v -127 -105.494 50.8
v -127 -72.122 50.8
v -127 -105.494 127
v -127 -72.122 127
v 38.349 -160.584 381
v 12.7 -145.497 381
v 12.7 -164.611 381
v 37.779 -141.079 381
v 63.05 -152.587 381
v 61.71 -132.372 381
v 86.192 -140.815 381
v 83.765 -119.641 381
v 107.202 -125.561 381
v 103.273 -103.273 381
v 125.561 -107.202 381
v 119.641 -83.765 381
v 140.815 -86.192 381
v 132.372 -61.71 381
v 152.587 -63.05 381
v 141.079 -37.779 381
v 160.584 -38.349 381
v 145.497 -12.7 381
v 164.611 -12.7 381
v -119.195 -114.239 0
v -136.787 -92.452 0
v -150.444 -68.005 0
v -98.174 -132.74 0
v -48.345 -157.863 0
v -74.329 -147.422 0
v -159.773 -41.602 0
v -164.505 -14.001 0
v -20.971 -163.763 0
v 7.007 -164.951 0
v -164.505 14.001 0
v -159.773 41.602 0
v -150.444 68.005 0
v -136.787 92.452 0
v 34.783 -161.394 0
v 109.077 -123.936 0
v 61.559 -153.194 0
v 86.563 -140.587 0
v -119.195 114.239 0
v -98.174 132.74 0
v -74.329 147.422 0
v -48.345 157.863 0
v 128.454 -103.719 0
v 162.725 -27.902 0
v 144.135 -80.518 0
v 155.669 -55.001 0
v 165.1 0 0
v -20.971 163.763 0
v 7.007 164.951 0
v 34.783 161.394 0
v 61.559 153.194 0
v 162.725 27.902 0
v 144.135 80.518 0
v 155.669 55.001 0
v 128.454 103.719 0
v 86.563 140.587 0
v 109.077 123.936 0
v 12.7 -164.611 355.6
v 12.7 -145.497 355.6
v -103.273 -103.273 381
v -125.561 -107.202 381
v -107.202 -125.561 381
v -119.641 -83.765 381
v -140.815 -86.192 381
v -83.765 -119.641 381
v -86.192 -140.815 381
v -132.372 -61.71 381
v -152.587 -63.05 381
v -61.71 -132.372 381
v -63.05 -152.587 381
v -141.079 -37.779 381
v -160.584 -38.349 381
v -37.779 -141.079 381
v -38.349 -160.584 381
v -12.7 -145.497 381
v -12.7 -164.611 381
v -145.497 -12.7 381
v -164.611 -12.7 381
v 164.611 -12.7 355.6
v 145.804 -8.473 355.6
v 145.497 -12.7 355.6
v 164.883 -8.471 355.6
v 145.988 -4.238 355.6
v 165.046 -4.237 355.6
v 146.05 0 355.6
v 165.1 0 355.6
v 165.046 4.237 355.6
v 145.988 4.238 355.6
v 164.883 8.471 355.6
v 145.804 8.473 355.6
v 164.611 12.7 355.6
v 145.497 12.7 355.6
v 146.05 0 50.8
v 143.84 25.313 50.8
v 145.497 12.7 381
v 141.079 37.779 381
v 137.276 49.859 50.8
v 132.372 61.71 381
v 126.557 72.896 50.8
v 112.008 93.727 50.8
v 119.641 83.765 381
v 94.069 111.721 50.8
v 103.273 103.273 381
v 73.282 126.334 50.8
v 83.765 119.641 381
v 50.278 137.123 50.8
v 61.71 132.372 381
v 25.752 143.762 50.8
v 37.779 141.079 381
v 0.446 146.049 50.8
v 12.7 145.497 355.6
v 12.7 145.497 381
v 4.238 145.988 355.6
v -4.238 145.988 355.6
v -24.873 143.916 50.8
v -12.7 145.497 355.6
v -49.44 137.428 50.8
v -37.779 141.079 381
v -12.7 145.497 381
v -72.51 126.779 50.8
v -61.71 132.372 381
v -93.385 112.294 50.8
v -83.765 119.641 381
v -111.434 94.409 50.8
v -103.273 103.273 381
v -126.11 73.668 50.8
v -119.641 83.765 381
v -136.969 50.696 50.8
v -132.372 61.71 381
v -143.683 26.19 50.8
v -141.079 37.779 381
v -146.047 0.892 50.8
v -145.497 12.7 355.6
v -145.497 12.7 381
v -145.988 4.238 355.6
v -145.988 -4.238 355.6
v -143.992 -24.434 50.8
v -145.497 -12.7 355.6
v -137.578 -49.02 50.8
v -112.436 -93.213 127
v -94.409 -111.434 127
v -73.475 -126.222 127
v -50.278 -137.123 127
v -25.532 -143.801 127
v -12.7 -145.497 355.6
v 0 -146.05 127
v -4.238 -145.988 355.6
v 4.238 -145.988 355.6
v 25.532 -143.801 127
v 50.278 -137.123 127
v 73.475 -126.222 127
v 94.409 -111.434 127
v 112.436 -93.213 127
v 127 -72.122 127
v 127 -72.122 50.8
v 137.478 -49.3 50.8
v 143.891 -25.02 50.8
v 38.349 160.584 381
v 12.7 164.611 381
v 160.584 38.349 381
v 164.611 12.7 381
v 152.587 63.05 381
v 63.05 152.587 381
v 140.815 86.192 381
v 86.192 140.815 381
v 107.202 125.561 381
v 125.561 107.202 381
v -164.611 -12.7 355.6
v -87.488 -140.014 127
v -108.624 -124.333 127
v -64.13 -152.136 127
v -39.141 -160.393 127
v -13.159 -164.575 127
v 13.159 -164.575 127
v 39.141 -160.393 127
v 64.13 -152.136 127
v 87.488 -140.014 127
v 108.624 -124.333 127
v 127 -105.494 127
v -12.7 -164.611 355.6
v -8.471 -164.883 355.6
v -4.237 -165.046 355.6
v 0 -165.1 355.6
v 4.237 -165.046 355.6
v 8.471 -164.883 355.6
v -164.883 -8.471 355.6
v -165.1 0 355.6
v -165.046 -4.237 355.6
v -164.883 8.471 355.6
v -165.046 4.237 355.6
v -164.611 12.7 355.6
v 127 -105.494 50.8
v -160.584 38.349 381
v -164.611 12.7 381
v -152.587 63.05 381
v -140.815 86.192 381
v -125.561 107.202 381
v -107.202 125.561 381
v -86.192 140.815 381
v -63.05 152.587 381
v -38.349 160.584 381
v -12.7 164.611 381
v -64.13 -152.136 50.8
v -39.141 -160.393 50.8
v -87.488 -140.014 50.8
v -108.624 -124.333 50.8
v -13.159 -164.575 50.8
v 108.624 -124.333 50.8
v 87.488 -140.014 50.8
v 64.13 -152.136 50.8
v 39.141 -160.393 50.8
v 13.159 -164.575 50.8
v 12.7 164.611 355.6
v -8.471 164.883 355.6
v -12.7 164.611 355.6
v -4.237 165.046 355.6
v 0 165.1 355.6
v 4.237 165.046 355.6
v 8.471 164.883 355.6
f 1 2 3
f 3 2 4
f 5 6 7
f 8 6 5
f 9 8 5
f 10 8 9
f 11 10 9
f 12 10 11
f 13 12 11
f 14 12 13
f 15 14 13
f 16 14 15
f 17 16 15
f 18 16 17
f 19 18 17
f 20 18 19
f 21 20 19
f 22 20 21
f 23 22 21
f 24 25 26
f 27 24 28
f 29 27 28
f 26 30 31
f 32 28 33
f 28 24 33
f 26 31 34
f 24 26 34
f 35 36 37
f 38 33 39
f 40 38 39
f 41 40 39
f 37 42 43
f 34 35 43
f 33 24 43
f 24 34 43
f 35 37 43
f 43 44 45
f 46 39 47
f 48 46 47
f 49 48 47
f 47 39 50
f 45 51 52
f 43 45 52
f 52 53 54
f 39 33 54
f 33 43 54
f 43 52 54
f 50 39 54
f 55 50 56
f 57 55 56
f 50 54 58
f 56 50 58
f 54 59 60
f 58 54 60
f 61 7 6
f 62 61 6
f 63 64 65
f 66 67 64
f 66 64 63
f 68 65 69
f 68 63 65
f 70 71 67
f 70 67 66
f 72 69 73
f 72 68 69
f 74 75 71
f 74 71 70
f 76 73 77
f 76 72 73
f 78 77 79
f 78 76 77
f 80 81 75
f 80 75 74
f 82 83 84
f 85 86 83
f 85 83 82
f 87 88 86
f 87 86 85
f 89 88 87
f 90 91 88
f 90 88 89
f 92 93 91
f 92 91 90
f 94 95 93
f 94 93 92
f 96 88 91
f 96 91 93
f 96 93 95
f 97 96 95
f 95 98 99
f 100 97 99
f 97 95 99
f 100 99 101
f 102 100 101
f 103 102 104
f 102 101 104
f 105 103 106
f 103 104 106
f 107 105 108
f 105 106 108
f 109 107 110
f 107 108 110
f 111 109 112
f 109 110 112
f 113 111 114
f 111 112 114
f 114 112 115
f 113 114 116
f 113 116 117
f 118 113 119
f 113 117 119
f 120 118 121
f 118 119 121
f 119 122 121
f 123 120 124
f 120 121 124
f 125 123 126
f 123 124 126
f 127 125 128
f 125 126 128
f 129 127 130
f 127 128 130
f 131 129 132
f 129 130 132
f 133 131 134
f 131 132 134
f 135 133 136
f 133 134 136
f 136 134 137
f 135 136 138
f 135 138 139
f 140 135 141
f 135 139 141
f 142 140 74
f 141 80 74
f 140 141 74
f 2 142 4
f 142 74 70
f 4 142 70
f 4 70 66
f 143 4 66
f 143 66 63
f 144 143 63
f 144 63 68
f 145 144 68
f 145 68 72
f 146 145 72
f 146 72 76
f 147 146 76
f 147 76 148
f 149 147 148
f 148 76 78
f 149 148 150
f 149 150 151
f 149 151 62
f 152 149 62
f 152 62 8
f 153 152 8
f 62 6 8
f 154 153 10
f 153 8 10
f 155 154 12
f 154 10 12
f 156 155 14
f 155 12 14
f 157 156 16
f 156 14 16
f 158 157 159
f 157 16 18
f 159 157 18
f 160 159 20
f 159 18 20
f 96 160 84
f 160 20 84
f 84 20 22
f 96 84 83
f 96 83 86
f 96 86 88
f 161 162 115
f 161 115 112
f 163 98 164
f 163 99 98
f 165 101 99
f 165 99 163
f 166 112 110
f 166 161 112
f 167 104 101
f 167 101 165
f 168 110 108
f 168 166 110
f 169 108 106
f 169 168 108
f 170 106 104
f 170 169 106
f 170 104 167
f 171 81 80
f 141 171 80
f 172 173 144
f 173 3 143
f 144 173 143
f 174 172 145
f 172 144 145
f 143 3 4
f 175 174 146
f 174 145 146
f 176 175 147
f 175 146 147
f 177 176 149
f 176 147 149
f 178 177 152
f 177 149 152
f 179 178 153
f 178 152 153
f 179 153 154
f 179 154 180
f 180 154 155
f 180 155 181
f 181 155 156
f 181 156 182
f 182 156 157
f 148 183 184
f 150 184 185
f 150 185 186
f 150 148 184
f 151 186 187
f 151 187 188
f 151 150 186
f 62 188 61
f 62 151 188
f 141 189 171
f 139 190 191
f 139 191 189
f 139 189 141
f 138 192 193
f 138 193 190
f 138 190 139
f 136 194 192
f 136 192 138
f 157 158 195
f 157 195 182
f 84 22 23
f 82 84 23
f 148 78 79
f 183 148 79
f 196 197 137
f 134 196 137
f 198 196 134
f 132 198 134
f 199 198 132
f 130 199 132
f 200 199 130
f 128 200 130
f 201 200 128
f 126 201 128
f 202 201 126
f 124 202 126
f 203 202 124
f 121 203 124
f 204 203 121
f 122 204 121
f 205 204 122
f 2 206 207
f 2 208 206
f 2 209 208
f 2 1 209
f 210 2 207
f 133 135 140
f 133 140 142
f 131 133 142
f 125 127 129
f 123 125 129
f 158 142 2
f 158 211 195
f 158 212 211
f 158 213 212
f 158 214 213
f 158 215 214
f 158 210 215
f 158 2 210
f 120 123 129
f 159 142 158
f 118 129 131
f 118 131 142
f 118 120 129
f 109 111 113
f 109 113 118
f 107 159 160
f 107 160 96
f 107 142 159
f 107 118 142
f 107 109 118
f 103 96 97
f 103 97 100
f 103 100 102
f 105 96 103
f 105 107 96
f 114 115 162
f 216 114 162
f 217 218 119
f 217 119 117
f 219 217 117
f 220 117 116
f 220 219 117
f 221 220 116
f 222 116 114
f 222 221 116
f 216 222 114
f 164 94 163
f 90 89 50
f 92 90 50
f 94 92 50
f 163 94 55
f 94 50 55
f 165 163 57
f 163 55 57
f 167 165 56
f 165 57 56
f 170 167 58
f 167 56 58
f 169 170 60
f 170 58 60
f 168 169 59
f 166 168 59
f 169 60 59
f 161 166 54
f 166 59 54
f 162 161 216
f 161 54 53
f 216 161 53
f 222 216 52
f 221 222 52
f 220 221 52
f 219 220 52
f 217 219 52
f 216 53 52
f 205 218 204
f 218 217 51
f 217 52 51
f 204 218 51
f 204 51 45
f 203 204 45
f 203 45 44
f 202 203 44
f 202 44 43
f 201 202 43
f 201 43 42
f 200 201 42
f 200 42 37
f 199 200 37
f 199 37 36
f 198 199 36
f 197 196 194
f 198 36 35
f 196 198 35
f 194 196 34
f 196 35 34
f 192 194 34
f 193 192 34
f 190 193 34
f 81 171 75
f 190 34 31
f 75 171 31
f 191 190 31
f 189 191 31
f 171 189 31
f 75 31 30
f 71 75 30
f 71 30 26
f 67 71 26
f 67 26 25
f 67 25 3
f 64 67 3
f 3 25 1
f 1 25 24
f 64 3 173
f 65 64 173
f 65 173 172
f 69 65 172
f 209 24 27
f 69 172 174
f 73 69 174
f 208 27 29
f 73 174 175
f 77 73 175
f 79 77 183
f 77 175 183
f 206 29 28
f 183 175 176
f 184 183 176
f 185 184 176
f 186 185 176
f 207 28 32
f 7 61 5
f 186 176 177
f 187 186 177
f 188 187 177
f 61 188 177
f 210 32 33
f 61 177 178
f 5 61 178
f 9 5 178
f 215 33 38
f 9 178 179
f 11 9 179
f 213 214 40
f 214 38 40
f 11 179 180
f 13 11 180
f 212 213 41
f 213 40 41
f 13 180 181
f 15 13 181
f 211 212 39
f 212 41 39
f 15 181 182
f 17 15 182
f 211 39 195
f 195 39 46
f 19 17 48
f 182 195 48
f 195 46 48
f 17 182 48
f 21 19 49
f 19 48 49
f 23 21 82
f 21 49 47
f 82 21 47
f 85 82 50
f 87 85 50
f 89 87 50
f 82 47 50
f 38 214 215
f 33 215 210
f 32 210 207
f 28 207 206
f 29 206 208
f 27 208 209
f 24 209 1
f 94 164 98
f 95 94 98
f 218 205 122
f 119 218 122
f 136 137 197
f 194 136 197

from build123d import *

# Parameters (mm, degrees)
F0_R     = 165.1
F1_DEPTH = 381
F2_R     = 146.05
F3_DEPTH = 330.2
F4_W     = 254
F4_H     = 76.2
F5_DEPTH = 177.8
F7_DEPTH = 25.4


with BuildPart() as f1:
    # F0 (on Top) → F1 (new body)
    with BuildSketch(Plane.XY):
        Circle(F0_R)
    extrude(amount=F1_DEPTH)

    # F2 (on face) → F3 (cut)
    with BuildSketch(Plane.XY.offset(381)):
        Circle(F2_R)
    extrude(amount=-F3_DEPTH, mode=Mode.SUBTRACT)

    # F4 (on Front) → F5 (cut)
    with BuildSketch(Plane.XZ):
        with Locations((0, 88.9)):
            Rectangle(F4_W, F4_H)
    extrude(amount=F5_DEPTH, mode=Mode.SUBTRACT)

    # F6 (on face) → F7 (cut)
    with BuildSketch(Plane.XY.offset(381)):
        with BuildLine():
            ThreePointArc((12.7, 164.6108137396), (6.3547089469, 164.9776581062), (0, 165.1))
            ThreePointArc((0, 165.1), (-6.3547089469, 164.9776581062), (-12.7, 164.6108137396))
            Line((-12.7, 164.6108137396), (-12.7, 145.4967783148))
            ThreePointArc((-12.7, 145.4967783148), (0, 146.05), (12.7, 145.4967783148))
            Line((12.7, 145.4967783148), (12.7, 164.6108137396))
        make_face()
        with BuildLine():
            Line((-145.4967783148, 12.7), (-164.6108137396, 12.7))
            ThreePointArc((-164.6108137396, 12.7), (-164.9776581062, 6.3547089469), (-165.1, 0))
            ThreePointArc((-165.1, 0), (-164.9776581062, -6.3547089469), (-164.6108137396, -12.7))
            Line((-164.6108137396, -12.7), (-145.4967783148, -12.7))
            ThreePointArc((-145.4967783148, -12.7), (-146.05, 0), (-145.4967783148, 12.7))
        make_face()
        with BuildLine():
            ThreePointArc((12.7, -145.4967783148), (0, -146.05), (-12.7, -145.4967783148))
            Line((-12.7, -145.4967783148), (-12.7, -164.6108137396))
            ThreePointArc((-12.7, -164.6108137396), (-6.3547090887, -164.9776581007), (-2.839e-07, -165.1))
            ThreePointArc((-2.839e-07, -165.1), (6.354708805, -164.9776581116), (12.7, -164.6108137396))
            Line((12.7, -164.6108137396), (12.7, -145.4967783148))
        make_face()
        with BuildLine():
            ThreePointArc((165.1, 0), (164.9776581062, 6.3547089469), (164.6108137396, 12.7))
            Line((164.6108137396, 12.7), (145.4967783148, 12.7))
            ThreePointArc((145.4967783148, 12.7), (145.9116290309, 6.3560218343), (146.05, 0))
            ThreePointArc((146.05, 0), (145.9116290309, -6.3560218343), (145.4967783148, -12.7))
            Line((145.4967783148, -12.7), (164.6108137396, -12.7))
            ThreePointArc((164.6108137396, -12.7), (164.9776581062, -6.3547089469), (165.1, 0))
        make_face()
    extrude(amount=-F7_DEPTH, mode=Mode.SUBTRACT)


solid = f1.part
